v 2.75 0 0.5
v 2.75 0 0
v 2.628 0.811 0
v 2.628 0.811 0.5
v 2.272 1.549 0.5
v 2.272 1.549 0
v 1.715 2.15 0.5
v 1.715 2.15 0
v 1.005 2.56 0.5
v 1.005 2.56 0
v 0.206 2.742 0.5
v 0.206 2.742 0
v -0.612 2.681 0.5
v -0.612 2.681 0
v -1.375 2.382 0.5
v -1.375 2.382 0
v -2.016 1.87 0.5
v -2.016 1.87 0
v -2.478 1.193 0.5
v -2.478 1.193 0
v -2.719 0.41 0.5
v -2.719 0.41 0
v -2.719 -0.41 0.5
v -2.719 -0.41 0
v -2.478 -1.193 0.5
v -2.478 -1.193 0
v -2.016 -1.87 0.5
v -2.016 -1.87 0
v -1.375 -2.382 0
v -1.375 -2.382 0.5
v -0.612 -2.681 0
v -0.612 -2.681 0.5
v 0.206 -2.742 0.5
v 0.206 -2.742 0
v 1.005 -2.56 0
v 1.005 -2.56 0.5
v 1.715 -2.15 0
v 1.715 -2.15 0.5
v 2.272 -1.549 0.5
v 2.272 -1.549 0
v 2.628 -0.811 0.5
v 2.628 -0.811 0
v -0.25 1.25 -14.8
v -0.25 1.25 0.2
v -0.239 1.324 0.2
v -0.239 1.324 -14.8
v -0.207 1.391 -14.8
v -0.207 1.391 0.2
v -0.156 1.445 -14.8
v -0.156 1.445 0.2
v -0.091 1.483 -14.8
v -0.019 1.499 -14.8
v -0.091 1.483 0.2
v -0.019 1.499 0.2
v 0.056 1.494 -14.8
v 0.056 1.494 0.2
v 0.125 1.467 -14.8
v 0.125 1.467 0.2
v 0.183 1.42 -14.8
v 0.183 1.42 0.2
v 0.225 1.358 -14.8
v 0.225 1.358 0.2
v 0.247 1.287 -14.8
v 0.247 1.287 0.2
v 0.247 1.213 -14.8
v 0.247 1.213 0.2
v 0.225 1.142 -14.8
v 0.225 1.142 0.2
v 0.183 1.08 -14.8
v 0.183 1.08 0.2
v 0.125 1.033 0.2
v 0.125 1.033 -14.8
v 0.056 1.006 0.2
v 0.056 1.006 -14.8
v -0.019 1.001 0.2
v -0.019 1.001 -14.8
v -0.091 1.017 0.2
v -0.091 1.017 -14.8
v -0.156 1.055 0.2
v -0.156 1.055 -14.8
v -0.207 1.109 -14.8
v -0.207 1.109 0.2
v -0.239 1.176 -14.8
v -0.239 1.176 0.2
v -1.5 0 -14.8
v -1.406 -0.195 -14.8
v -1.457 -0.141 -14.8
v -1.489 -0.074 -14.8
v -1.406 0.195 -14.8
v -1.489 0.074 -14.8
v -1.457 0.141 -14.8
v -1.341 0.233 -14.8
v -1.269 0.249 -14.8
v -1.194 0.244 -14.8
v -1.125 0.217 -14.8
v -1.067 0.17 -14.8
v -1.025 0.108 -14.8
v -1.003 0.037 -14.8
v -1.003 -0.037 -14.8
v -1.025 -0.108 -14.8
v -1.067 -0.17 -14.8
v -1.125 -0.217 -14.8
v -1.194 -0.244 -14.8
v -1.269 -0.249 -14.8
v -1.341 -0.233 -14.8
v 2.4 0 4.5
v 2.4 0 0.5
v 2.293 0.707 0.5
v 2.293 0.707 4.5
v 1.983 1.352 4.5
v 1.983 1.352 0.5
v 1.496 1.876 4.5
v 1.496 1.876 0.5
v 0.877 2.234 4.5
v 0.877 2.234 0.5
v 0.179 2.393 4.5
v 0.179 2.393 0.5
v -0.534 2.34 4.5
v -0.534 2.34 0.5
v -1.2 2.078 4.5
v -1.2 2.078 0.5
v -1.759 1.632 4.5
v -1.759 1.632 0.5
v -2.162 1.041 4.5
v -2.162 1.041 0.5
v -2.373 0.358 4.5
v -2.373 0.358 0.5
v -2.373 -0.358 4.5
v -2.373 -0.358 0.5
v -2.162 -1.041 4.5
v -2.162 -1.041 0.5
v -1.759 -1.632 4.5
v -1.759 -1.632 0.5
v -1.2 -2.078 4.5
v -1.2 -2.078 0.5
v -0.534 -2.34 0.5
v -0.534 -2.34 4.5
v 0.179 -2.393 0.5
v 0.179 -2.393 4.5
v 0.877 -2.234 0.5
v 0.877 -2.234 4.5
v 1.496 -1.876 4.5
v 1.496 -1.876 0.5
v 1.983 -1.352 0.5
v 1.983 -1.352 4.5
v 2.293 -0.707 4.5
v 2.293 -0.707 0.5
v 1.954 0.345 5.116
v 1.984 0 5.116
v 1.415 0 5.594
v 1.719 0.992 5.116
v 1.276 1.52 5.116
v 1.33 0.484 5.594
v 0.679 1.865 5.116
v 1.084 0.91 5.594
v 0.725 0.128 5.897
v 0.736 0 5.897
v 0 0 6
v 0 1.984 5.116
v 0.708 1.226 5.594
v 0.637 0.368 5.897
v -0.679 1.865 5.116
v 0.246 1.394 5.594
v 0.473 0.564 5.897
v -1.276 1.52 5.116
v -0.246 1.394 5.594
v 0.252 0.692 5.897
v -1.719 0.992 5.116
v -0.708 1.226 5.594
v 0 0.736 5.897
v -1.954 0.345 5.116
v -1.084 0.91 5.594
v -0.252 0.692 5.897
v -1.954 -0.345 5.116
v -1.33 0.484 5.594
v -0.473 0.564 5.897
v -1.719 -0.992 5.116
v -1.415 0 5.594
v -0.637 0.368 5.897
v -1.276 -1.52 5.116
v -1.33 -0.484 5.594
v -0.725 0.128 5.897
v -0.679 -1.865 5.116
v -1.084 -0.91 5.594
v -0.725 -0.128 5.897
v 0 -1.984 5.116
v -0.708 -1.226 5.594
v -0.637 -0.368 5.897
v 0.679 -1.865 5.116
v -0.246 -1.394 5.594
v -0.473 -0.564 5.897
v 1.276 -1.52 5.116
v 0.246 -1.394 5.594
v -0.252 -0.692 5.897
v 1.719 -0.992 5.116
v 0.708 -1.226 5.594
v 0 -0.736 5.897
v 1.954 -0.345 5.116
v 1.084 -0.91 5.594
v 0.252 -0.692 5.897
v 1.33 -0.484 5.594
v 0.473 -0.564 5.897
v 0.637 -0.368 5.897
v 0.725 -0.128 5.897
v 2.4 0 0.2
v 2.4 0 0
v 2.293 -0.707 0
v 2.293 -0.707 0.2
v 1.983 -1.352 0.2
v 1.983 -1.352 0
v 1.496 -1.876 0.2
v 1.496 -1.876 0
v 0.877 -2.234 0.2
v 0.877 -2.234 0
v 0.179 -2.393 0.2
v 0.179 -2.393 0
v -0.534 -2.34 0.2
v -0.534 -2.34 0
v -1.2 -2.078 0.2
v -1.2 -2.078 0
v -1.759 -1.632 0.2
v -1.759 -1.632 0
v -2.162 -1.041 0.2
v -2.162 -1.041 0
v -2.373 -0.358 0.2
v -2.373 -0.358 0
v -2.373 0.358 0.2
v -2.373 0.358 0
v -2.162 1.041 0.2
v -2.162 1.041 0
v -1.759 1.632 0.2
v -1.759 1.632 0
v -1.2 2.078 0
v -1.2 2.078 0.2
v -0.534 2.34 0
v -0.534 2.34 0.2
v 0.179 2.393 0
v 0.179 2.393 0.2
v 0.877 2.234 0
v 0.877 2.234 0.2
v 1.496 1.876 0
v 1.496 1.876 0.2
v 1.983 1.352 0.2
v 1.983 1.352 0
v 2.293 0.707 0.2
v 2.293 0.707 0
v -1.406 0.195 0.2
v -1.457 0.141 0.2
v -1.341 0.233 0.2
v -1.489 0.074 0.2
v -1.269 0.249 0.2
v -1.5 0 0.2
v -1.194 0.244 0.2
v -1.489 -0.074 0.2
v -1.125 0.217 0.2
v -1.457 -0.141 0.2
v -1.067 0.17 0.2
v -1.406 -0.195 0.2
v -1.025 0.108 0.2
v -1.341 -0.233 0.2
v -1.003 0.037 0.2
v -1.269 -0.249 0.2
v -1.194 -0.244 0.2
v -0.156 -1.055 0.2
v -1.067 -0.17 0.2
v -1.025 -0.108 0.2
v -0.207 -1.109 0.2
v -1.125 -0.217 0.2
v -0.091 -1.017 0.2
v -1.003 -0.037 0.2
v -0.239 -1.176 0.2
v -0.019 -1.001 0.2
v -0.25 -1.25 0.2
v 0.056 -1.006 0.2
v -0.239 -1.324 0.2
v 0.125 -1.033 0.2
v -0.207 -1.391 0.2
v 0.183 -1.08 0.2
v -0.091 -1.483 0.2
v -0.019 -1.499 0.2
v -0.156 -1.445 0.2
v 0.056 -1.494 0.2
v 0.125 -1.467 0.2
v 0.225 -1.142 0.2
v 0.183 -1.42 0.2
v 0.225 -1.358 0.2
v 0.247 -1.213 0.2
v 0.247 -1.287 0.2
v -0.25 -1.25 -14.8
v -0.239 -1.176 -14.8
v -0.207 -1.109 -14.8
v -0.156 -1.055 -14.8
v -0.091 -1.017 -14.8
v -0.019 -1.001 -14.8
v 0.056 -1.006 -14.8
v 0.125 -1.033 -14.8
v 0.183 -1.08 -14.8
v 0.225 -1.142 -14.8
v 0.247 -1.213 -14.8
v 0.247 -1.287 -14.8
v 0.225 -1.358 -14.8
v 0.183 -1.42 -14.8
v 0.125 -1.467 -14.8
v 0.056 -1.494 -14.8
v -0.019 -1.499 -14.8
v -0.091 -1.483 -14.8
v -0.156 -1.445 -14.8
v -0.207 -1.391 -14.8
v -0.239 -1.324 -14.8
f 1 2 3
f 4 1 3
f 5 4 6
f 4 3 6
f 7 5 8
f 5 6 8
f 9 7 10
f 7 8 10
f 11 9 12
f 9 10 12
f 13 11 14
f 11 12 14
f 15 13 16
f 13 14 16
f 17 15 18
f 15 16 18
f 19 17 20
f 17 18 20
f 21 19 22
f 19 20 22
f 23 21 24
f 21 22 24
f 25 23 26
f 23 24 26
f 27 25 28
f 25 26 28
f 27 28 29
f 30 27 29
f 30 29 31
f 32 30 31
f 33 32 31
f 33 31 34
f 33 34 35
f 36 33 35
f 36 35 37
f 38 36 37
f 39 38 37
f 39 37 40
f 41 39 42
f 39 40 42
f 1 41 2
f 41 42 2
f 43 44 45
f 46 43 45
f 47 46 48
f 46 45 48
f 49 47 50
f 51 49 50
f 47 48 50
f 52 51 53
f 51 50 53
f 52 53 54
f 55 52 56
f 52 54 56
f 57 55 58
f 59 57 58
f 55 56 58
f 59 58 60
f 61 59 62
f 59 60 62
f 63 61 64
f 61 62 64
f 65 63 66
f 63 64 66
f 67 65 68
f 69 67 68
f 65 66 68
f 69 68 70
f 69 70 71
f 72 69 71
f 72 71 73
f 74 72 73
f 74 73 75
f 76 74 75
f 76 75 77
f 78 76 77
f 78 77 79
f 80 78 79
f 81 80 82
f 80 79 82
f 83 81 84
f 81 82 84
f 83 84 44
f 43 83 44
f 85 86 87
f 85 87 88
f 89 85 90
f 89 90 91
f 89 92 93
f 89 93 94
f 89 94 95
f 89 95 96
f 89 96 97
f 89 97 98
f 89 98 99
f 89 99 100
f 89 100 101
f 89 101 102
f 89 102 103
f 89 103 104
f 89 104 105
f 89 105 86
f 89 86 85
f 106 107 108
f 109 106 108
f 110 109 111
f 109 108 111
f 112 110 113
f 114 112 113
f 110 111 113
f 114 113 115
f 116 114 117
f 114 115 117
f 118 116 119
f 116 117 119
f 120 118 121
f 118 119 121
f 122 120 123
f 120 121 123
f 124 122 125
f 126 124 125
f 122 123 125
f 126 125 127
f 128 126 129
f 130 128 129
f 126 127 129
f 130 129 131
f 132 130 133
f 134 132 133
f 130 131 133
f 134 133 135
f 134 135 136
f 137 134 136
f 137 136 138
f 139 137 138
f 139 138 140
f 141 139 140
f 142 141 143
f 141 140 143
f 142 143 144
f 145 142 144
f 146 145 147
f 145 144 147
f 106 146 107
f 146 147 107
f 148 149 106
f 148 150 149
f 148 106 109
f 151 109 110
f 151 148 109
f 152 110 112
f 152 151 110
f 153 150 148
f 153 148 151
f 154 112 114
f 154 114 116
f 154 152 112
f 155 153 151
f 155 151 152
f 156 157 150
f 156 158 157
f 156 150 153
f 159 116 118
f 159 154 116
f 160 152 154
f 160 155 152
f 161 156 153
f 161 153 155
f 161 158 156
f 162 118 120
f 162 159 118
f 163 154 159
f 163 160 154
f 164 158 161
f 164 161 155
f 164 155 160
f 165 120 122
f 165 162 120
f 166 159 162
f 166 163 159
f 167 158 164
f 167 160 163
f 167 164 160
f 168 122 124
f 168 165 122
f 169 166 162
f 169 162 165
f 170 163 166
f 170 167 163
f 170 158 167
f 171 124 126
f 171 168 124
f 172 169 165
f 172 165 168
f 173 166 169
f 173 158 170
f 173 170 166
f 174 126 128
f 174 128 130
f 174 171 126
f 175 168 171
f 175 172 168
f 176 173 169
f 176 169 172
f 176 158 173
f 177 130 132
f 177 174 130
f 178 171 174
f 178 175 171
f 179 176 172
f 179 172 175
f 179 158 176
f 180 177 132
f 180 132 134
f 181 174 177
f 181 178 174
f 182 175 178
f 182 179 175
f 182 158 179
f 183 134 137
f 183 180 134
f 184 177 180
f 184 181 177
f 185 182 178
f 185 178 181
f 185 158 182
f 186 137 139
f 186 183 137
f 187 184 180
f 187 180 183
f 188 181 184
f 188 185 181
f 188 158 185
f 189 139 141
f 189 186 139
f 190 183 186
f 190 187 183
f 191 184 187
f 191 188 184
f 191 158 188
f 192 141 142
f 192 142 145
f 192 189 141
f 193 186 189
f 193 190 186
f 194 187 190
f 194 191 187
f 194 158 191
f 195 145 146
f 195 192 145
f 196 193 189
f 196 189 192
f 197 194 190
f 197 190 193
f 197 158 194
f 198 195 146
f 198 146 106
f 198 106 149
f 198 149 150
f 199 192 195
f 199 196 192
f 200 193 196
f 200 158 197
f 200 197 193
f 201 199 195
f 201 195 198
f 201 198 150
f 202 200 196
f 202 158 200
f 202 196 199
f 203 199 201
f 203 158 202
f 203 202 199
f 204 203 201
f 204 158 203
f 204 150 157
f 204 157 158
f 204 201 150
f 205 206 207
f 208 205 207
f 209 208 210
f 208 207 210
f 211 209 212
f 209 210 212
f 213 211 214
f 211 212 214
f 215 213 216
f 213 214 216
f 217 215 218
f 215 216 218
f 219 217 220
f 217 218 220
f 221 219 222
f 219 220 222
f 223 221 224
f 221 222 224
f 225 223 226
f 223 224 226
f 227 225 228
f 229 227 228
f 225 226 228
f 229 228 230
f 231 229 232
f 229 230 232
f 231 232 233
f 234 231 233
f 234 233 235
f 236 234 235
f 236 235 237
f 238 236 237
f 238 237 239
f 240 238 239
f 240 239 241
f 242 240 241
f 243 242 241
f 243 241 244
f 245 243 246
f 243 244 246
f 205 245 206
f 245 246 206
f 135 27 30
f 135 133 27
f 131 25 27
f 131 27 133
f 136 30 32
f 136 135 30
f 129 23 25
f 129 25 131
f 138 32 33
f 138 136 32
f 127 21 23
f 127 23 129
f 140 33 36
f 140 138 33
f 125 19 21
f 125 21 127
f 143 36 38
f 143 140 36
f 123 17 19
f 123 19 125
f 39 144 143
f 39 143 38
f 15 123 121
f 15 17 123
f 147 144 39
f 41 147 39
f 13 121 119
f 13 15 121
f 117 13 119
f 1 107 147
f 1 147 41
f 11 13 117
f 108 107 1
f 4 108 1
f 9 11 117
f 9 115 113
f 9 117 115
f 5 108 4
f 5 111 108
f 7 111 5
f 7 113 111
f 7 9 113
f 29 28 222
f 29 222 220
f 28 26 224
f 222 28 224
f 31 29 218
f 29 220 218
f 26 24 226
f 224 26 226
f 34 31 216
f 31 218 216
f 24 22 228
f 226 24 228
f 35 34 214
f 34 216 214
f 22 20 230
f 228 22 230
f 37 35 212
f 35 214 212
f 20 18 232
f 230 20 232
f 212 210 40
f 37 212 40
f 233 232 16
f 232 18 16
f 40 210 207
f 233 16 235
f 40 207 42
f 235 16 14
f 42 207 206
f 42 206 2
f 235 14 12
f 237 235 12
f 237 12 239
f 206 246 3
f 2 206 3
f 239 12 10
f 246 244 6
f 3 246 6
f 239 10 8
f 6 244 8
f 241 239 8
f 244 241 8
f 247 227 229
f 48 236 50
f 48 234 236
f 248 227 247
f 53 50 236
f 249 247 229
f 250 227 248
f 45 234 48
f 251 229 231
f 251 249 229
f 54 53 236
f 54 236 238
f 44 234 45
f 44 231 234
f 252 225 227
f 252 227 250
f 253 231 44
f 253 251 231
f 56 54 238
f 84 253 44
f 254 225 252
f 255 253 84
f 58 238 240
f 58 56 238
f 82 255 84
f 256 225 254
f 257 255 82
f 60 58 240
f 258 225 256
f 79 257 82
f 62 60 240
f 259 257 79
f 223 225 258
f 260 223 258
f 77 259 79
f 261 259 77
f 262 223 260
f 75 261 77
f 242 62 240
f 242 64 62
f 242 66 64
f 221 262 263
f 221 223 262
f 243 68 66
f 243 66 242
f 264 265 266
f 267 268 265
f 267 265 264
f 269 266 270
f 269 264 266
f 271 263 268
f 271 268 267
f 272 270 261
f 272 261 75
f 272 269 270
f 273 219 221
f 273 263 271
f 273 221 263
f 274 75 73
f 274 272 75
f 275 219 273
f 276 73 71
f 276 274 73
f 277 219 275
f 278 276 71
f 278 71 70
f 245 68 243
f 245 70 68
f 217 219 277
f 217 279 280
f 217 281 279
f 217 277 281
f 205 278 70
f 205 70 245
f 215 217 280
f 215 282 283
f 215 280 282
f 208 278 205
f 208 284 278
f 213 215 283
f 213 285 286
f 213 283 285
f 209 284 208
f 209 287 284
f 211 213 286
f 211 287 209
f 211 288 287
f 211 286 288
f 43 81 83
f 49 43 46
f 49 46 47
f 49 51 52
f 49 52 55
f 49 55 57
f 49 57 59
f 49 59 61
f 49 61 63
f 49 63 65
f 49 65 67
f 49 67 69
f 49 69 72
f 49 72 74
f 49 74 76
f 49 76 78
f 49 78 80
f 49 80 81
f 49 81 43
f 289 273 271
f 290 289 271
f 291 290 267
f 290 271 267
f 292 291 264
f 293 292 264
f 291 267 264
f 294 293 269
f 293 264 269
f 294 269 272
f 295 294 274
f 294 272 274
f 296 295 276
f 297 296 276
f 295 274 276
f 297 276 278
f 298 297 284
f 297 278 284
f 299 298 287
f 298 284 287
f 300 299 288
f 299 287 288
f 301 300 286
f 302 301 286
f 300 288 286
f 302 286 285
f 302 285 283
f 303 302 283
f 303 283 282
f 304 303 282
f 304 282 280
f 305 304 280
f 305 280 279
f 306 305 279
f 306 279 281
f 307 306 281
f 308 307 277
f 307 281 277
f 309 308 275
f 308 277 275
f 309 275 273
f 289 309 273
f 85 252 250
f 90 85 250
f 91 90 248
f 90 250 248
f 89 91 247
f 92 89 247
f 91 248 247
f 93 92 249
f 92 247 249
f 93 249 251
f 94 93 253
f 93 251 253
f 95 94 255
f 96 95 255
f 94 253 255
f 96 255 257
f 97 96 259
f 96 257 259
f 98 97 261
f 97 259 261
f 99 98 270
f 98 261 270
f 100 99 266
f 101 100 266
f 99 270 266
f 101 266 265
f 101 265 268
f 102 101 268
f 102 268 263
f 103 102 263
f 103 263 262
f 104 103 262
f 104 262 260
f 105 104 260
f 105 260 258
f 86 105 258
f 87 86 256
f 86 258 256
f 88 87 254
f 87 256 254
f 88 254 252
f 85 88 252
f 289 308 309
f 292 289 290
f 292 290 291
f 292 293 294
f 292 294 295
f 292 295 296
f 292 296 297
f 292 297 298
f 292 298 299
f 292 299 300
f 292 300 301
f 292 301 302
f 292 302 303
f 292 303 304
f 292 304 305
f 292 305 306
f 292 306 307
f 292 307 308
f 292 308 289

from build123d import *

# Parameters (mm, degrees)
SKETCH2_R           = 2.75
BOSS_EXTRUDE2_DEPTH = 0.5
SKETCH4_R           = 2.4
BOSS_EXTRUDE3_DEPTH = 4
SKETCH5_R           = 2.4
CUT_EXTRUDE1_DEPTH  = 0.2
SKETCH6_R           = 0.25
BOSS_EXTRUDE4_DEPTH = 15


# Read off the part's stored shape, not the designer's step: Dome1
with BuildPart() as part:
    # Sketch2 → Boss-Extrude2 (new body)
    with BuildSketch(Plane.XY):
        Circle(SKETCH2_R)
    extrude(amount=BOSS_EXTRUDE2_DEPTH)

    # Sketch4 → Boss-Extrude3 (add)
    with BuildSketch(Plane.XY.offset(0.5)):
        Circle(SKETCH4_R)
    extrude(amount=BOSS_EXTRUDE3_DEPTH)

    # Dome1 outline → Dome1 (revolve)
    with BuildSketch(Plane.XZ):
        with BuildLine():
            Line((0, 4.5), (2.400000001, 4.499999998))
            ThreePointArc((2.400000001, 4.499999998), (1.415097171, 5.594155471), (0, 6))
            Line((0, 6), (0, 4.5))
        make_face()
    revolve(axis=Axis((0, 0, 0), (0, 0, 1)))

    # Sketch5 → Cut-Extrude1 (cut)
    with BuildSketch(Plane(origin=(0, 0, 0), x_dir=(-1, 0, 0), z_dir=(0, 0, -1))):
        with Locations(Location((0, 0, 0), (0, 0, 180))):
            Circle(SKETCH5_R)
    extrude(amount=-CUT_EXTRUDE1_DEPTH, mode=Mode.SUBTRACT)

    # Sketch6 → Boss-Extrude4 (add)
    with BuildSketch(Plane(origin=(0, 0, 0.2), x_dir=(-1, 0, 0), z_dir=(0, 0, -1))):
        with Locations((0, 1.25)):
            Circle(SKETCH6_R)
        with Locations((1.25, 0)):
            Circle(SKETCH6_R)
        with Locations((0, -1.25)):
            Circle(SKETCH6_R)
    extrude(amount=BOSS_EXTRUDE4_DEPTH)


solid = part.part
